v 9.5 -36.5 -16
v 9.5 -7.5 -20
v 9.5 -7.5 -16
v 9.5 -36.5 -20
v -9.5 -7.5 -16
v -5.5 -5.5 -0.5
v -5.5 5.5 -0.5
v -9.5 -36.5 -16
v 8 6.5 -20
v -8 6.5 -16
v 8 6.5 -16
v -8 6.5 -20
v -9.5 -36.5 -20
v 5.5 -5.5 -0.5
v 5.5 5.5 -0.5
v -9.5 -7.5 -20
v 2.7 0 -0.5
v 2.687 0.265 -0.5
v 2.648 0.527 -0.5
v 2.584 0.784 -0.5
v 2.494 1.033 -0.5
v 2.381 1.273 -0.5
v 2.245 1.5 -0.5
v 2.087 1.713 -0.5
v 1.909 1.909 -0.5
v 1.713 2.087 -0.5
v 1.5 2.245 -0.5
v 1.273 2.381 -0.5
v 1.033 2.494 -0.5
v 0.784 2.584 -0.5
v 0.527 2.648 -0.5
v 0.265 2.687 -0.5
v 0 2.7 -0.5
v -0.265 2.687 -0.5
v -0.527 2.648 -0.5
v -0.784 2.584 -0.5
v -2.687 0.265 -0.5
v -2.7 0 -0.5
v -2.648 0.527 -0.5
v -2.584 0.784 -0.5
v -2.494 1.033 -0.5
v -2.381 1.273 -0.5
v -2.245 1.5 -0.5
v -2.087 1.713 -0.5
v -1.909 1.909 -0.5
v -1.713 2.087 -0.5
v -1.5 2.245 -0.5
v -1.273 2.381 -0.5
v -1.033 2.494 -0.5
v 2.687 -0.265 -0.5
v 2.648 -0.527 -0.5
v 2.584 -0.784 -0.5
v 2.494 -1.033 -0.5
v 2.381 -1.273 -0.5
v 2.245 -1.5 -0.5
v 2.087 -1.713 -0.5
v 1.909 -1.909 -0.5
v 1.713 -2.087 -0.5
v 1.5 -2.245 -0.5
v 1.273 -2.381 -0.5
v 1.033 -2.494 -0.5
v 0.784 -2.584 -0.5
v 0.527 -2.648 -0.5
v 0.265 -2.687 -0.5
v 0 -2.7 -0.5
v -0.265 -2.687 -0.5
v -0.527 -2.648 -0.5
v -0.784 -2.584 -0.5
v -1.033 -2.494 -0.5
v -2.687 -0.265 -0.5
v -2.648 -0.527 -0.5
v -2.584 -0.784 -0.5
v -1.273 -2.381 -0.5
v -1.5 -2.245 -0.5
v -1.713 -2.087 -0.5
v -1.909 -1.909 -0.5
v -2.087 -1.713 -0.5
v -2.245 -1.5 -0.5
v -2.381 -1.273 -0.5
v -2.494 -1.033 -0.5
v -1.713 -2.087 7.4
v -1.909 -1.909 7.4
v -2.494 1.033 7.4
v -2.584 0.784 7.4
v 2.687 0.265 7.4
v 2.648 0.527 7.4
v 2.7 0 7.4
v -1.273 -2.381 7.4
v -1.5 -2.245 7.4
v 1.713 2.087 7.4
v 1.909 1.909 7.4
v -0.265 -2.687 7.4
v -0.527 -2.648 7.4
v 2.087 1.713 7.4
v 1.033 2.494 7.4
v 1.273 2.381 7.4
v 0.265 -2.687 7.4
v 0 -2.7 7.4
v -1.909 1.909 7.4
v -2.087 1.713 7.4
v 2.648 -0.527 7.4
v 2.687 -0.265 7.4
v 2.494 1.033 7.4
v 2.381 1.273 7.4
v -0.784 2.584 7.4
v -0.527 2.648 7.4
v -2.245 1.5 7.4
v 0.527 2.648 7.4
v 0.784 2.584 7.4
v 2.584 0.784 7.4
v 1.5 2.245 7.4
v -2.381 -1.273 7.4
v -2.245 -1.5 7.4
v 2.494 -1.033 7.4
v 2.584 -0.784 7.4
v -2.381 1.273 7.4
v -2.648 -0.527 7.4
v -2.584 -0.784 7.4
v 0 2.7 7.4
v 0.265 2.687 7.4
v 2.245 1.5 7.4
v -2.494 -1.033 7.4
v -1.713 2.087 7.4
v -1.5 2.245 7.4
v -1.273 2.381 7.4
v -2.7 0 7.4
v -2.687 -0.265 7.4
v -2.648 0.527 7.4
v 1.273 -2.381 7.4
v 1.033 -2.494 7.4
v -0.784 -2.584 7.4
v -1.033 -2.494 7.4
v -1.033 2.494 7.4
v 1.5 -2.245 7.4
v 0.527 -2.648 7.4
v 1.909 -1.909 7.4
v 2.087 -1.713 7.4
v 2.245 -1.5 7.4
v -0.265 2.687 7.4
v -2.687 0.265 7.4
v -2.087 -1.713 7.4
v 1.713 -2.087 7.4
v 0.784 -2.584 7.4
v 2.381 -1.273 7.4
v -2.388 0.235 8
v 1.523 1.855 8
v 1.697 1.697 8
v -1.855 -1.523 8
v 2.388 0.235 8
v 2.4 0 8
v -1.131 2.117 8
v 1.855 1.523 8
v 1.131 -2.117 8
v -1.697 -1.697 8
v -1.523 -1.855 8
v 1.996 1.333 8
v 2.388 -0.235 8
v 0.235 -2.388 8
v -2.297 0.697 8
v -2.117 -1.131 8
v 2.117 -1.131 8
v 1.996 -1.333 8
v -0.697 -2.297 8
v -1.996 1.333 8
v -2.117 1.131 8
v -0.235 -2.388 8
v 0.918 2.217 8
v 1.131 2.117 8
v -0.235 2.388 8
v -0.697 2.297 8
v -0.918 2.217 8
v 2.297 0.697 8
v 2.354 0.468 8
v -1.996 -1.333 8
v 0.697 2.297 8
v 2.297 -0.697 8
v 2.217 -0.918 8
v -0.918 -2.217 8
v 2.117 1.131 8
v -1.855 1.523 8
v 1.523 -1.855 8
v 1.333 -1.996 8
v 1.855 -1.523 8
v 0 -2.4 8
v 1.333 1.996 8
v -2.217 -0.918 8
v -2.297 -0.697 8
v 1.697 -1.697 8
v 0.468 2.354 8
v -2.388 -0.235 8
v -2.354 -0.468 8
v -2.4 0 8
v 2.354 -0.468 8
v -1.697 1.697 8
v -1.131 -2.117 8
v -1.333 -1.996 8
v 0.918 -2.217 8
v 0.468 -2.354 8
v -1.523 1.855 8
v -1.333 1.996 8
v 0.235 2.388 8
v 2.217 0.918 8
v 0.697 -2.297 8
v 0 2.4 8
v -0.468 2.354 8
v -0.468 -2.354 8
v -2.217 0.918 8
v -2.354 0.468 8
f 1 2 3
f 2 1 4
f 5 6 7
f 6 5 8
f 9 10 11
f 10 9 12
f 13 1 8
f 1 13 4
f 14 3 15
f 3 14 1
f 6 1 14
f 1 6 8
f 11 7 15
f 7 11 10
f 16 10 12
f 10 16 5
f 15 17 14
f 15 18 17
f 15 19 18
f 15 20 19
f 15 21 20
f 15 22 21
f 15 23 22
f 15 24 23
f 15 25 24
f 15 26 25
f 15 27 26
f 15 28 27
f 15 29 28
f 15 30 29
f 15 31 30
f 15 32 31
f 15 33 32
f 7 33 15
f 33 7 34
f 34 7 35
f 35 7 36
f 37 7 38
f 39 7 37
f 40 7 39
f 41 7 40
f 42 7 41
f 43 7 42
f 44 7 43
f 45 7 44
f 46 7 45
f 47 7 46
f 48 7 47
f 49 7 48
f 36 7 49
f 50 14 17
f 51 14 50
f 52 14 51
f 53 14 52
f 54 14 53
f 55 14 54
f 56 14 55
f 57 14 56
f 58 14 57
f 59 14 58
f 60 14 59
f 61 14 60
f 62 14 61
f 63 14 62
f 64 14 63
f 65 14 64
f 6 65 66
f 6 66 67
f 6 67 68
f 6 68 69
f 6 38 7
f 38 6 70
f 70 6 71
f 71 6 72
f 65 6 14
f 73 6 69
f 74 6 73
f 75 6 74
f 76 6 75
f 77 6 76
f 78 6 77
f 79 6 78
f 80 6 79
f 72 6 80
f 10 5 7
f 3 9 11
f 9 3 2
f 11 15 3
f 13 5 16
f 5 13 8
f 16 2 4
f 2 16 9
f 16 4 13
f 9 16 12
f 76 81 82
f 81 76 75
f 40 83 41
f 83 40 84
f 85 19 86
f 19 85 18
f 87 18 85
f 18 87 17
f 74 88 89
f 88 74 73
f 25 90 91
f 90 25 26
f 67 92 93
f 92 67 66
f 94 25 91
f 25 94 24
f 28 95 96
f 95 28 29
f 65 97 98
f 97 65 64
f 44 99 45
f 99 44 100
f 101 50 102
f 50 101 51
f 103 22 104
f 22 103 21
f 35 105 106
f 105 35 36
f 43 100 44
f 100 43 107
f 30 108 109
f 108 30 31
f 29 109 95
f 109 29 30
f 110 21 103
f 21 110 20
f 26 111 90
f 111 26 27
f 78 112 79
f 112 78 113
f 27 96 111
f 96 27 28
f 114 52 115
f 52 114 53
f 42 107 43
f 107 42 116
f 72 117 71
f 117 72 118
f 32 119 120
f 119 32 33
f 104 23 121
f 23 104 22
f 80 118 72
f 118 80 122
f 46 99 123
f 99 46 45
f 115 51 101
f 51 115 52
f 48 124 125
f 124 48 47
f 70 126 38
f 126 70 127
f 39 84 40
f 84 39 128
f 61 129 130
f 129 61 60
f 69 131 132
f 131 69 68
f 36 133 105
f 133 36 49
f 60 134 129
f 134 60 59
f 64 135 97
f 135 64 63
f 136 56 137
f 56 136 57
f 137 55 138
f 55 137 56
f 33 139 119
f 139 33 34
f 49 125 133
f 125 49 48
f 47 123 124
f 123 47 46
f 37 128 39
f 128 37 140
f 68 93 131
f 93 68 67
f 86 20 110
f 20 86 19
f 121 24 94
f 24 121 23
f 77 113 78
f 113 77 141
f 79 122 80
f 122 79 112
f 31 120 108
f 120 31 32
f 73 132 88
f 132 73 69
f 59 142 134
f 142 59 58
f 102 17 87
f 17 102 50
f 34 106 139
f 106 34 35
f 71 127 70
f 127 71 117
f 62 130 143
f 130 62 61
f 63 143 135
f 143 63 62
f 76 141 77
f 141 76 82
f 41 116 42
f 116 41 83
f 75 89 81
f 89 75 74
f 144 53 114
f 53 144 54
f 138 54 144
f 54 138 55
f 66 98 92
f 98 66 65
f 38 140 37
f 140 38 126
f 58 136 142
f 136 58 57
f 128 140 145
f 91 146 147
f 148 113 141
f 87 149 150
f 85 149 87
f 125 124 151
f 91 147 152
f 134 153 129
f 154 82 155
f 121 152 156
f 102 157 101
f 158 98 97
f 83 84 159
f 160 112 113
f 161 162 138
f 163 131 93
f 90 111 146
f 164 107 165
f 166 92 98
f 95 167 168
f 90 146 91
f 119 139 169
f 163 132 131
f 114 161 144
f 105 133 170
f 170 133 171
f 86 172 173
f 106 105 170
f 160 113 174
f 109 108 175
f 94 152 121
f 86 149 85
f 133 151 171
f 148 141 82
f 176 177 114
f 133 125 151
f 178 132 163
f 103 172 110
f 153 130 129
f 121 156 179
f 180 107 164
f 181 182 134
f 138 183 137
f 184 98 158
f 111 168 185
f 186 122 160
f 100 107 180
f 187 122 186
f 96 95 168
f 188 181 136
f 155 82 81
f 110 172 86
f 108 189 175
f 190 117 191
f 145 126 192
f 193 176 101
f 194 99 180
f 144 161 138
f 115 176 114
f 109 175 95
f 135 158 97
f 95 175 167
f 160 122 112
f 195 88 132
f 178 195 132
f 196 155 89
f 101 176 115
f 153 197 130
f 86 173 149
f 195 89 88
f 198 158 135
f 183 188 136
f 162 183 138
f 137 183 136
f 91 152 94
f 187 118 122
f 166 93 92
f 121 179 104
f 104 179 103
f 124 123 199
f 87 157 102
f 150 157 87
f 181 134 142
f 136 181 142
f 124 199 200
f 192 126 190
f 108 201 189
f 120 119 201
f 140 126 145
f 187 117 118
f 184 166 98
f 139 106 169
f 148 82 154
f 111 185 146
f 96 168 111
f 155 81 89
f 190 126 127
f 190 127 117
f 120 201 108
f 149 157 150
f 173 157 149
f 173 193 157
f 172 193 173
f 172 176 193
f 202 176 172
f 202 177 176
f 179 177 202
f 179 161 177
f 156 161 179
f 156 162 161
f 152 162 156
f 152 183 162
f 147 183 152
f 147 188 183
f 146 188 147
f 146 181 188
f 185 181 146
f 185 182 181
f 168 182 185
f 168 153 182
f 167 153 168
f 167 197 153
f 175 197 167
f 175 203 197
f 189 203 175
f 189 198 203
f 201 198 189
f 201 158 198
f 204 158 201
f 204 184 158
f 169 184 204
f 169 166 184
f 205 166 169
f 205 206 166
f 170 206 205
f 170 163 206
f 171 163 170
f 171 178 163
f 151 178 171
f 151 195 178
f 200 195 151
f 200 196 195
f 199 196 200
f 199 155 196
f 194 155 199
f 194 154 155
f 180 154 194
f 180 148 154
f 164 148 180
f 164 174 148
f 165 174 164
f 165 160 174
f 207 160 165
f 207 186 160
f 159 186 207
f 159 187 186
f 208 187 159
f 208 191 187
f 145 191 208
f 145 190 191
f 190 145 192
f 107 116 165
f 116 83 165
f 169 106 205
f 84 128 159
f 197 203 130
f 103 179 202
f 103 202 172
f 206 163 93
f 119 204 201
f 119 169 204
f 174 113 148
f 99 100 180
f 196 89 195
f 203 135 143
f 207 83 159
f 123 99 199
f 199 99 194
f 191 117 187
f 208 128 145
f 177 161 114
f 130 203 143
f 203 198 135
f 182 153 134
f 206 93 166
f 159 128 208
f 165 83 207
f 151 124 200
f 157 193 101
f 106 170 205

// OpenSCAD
// Jetsons P20: forward-offset replacement feet. One STL; print two copies.
// Mount peg stays at x=0,y=0,z=0; enclosure underside at z=0.
// Device front is NEGATIVE Y. Wider contact extends forward.
$fn=64;
module foot(){
 union(){
  // Long continuous foot with stable flat bottom z=-20
  hull(){
   translate([0, -22, -18]) cube([19,29,4],center=true); // y -36.5 .. -7.5
   translate([0, 0, -18]) cube([16,13,4],center=true);  // y -6.5 .. +6.5
   translate([0, 0, -3]) cube([11,11,5],center=true);
  }
  // Peg from original Phase 22: Ø5.4, 7.4 straight + 0.6 taper
  translate([0,0,-1.0]) cylinder(d=5.4,h=8.4); // 1 mm overlap into body; fixes floating peg
  translate([0,0,7.4]) cylinder(d1=5.4,d2=4.8,h=0.6);
 }
}
foot();
